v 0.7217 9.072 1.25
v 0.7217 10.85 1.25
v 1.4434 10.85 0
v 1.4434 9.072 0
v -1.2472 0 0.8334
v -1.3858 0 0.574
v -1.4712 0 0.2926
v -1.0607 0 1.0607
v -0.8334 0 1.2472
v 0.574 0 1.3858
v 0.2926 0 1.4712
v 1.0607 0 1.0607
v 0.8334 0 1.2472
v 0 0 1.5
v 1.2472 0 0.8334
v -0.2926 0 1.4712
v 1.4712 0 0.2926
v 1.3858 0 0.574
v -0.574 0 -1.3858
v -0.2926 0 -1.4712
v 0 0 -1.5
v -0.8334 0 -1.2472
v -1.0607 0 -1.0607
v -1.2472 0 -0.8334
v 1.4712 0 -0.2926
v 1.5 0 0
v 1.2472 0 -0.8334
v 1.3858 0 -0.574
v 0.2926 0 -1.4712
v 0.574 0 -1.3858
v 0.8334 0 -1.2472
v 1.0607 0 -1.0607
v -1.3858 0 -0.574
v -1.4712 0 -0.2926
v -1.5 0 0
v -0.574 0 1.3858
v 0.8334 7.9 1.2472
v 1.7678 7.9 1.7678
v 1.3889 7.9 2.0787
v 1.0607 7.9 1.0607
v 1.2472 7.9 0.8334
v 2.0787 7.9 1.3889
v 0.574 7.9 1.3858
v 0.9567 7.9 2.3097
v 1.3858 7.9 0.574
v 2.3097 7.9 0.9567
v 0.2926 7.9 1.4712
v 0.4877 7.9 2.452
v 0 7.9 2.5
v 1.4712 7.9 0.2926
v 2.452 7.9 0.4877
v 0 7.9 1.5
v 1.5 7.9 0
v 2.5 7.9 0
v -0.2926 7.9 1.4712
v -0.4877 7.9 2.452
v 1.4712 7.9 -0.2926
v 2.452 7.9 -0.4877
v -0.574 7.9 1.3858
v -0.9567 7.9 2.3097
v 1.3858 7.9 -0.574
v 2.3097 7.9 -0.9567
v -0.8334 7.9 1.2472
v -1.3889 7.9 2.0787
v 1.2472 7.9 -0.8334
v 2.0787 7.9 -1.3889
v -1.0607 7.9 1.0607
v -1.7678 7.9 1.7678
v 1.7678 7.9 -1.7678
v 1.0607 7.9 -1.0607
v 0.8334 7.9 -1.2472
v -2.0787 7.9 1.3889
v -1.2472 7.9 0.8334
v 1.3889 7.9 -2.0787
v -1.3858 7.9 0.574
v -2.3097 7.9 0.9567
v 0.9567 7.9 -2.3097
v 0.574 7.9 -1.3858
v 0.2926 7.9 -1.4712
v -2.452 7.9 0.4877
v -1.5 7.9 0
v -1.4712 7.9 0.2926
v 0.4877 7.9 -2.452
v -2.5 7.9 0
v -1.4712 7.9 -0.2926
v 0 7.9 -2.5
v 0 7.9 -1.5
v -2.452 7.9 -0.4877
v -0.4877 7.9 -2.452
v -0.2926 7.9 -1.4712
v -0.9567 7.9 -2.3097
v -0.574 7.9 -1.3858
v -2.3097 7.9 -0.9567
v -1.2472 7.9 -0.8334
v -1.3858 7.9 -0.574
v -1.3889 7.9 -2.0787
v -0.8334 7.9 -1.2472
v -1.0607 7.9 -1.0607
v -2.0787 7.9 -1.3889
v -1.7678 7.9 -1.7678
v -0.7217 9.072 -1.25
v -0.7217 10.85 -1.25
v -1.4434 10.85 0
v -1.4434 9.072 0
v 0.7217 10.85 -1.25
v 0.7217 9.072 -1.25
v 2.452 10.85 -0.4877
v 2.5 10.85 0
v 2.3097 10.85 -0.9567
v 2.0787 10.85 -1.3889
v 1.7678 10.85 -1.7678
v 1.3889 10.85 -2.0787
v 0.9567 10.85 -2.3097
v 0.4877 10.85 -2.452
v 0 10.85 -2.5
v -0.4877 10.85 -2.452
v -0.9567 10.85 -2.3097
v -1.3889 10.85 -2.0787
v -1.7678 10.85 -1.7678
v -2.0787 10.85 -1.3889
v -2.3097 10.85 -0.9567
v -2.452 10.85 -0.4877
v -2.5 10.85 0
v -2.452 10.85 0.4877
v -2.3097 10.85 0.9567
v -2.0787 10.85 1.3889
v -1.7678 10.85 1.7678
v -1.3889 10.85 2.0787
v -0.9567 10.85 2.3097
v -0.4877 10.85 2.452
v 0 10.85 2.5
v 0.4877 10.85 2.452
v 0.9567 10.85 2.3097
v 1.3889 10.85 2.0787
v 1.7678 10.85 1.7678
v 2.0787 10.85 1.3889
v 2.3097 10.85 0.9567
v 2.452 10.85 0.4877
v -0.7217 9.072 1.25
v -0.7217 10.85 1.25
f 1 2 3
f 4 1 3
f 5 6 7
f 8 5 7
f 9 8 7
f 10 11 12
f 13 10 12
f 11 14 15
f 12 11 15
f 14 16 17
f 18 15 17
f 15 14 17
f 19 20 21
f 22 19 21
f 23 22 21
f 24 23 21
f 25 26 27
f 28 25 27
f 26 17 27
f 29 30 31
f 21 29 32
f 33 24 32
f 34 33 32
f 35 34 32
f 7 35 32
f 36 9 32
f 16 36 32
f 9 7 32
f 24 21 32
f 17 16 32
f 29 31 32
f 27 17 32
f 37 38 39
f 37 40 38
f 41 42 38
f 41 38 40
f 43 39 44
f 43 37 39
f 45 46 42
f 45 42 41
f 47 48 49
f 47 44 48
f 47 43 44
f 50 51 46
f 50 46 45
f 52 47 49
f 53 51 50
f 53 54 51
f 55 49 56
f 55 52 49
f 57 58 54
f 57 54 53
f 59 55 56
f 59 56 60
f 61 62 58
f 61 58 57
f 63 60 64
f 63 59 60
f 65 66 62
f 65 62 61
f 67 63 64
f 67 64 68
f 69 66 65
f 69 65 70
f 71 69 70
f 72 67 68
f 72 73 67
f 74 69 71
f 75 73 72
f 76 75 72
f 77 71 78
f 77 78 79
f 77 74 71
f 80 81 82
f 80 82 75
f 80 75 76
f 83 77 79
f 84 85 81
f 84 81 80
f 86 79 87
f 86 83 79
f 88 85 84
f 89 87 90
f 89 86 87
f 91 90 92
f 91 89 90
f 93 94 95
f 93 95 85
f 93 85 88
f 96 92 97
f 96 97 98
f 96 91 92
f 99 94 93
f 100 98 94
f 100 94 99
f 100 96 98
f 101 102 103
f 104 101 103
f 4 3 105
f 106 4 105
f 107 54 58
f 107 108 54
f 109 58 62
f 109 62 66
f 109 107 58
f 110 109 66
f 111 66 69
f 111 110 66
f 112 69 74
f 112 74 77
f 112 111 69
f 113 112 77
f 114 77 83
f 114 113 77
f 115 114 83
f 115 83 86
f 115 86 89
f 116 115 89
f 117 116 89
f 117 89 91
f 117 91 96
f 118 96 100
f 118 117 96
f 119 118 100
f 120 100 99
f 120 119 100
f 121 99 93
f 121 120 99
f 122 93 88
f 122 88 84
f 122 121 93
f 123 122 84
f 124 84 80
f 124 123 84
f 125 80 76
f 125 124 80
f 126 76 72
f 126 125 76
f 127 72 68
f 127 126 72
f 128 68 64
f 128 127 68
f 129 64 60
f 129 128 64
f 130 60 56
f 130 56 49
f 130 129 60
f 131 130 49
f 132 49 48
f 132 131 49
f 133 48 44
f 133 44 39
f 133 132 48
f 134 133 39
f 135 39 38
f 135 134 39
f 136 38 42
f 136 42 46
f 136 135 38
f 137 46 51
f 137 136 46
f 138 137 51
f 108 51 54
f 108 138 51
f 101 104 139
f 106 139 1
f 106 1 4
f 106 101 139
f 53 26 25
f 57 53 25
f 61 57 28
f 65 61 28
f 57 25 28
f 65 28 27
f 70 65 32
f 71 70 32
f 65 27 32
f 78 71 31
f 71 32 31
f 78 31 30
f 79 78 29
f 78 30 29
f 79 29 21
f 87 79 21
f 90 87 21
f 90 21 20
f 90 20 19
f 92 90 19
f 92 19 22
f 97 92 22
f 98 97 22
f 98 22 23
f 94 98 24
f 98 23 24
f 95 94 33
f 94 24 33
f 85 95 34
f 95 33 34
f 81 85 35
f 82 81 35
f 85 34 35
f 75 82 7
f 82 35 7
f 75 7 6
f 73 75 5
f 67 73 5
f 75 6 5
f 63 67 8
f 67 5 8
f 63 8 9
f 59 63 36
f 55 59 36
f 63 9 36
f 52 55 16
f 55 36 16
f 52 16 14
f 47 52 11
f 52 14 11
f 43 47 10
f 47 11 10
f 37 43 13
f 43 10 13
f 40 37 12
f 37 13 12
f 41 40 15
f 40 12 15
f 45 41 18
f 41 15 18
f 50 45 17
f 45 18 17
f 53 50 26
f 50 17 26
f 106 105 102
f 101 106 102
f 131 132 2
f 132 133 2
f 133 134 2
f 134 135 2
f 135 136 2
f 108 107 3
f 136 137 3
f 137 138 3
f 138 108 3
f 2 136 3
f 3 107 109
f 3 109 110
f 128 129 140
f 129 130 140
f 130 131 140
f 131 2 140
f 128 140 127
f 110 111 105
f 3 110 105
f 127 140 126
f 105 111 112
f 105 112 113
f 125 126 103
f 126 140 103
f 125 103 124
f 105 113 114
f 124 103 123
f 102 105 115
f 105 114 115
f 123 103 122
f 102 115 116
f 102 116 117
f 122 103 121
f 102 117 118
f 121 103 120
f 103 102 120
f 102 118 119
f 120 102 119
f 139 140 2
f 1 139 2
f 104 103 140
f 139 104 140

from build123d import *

# Parameters (mm, degrees)
SKETCH1_R           = 1.5
BOSS_EXTRUDE1_DEPTH = 7.9
SKETCH3_W           = 2.5
SKETCH3_H           = 2.95
CUT_EXTRUDE1_DEPTH  = 1.778


with BuildPart() as part:
    # Sketch1 → Boss-Extrude1 (new body)
    with BuildSketch(Plane(origin=(0, 0, 0), x_dir=(1, 0, 0), z_dir=(0, 1, 0))):
        Circle(SKETCH1_R)
    extrude(amount=BOSS_EXTRUDE1_DEPTH)

    # Sketch3 → Revolve1 (revolve)
    with BuildSketch(Plane.XY):
        with Locations((1.25, 9.375)):
            Rectangle(SKETCH3_W, SKETCH3_H)
    revolve(axis=Axis((0, 7.9, 0), (0, 1, 0)))

    # Sketch4 → Cut-Extrude1 (cut)
    with BuildSketch(Plane(origin=(0, 10.85, 0), x_dir=(1, 0, 0), z_dir=(0, 1, 0))):
        Polygon((1.443375673, 0), (0.721687836, 1.25), (-0.721687836, 1.25), (-1.443375673, 0), (-0.721687836, -1.25), (0.721687836, -1.25), align=None)
    extrude(amount=-CUT_EXTRUDE1_DEPTH, mode=Mode.SUBTRACT)


solid = part.part
